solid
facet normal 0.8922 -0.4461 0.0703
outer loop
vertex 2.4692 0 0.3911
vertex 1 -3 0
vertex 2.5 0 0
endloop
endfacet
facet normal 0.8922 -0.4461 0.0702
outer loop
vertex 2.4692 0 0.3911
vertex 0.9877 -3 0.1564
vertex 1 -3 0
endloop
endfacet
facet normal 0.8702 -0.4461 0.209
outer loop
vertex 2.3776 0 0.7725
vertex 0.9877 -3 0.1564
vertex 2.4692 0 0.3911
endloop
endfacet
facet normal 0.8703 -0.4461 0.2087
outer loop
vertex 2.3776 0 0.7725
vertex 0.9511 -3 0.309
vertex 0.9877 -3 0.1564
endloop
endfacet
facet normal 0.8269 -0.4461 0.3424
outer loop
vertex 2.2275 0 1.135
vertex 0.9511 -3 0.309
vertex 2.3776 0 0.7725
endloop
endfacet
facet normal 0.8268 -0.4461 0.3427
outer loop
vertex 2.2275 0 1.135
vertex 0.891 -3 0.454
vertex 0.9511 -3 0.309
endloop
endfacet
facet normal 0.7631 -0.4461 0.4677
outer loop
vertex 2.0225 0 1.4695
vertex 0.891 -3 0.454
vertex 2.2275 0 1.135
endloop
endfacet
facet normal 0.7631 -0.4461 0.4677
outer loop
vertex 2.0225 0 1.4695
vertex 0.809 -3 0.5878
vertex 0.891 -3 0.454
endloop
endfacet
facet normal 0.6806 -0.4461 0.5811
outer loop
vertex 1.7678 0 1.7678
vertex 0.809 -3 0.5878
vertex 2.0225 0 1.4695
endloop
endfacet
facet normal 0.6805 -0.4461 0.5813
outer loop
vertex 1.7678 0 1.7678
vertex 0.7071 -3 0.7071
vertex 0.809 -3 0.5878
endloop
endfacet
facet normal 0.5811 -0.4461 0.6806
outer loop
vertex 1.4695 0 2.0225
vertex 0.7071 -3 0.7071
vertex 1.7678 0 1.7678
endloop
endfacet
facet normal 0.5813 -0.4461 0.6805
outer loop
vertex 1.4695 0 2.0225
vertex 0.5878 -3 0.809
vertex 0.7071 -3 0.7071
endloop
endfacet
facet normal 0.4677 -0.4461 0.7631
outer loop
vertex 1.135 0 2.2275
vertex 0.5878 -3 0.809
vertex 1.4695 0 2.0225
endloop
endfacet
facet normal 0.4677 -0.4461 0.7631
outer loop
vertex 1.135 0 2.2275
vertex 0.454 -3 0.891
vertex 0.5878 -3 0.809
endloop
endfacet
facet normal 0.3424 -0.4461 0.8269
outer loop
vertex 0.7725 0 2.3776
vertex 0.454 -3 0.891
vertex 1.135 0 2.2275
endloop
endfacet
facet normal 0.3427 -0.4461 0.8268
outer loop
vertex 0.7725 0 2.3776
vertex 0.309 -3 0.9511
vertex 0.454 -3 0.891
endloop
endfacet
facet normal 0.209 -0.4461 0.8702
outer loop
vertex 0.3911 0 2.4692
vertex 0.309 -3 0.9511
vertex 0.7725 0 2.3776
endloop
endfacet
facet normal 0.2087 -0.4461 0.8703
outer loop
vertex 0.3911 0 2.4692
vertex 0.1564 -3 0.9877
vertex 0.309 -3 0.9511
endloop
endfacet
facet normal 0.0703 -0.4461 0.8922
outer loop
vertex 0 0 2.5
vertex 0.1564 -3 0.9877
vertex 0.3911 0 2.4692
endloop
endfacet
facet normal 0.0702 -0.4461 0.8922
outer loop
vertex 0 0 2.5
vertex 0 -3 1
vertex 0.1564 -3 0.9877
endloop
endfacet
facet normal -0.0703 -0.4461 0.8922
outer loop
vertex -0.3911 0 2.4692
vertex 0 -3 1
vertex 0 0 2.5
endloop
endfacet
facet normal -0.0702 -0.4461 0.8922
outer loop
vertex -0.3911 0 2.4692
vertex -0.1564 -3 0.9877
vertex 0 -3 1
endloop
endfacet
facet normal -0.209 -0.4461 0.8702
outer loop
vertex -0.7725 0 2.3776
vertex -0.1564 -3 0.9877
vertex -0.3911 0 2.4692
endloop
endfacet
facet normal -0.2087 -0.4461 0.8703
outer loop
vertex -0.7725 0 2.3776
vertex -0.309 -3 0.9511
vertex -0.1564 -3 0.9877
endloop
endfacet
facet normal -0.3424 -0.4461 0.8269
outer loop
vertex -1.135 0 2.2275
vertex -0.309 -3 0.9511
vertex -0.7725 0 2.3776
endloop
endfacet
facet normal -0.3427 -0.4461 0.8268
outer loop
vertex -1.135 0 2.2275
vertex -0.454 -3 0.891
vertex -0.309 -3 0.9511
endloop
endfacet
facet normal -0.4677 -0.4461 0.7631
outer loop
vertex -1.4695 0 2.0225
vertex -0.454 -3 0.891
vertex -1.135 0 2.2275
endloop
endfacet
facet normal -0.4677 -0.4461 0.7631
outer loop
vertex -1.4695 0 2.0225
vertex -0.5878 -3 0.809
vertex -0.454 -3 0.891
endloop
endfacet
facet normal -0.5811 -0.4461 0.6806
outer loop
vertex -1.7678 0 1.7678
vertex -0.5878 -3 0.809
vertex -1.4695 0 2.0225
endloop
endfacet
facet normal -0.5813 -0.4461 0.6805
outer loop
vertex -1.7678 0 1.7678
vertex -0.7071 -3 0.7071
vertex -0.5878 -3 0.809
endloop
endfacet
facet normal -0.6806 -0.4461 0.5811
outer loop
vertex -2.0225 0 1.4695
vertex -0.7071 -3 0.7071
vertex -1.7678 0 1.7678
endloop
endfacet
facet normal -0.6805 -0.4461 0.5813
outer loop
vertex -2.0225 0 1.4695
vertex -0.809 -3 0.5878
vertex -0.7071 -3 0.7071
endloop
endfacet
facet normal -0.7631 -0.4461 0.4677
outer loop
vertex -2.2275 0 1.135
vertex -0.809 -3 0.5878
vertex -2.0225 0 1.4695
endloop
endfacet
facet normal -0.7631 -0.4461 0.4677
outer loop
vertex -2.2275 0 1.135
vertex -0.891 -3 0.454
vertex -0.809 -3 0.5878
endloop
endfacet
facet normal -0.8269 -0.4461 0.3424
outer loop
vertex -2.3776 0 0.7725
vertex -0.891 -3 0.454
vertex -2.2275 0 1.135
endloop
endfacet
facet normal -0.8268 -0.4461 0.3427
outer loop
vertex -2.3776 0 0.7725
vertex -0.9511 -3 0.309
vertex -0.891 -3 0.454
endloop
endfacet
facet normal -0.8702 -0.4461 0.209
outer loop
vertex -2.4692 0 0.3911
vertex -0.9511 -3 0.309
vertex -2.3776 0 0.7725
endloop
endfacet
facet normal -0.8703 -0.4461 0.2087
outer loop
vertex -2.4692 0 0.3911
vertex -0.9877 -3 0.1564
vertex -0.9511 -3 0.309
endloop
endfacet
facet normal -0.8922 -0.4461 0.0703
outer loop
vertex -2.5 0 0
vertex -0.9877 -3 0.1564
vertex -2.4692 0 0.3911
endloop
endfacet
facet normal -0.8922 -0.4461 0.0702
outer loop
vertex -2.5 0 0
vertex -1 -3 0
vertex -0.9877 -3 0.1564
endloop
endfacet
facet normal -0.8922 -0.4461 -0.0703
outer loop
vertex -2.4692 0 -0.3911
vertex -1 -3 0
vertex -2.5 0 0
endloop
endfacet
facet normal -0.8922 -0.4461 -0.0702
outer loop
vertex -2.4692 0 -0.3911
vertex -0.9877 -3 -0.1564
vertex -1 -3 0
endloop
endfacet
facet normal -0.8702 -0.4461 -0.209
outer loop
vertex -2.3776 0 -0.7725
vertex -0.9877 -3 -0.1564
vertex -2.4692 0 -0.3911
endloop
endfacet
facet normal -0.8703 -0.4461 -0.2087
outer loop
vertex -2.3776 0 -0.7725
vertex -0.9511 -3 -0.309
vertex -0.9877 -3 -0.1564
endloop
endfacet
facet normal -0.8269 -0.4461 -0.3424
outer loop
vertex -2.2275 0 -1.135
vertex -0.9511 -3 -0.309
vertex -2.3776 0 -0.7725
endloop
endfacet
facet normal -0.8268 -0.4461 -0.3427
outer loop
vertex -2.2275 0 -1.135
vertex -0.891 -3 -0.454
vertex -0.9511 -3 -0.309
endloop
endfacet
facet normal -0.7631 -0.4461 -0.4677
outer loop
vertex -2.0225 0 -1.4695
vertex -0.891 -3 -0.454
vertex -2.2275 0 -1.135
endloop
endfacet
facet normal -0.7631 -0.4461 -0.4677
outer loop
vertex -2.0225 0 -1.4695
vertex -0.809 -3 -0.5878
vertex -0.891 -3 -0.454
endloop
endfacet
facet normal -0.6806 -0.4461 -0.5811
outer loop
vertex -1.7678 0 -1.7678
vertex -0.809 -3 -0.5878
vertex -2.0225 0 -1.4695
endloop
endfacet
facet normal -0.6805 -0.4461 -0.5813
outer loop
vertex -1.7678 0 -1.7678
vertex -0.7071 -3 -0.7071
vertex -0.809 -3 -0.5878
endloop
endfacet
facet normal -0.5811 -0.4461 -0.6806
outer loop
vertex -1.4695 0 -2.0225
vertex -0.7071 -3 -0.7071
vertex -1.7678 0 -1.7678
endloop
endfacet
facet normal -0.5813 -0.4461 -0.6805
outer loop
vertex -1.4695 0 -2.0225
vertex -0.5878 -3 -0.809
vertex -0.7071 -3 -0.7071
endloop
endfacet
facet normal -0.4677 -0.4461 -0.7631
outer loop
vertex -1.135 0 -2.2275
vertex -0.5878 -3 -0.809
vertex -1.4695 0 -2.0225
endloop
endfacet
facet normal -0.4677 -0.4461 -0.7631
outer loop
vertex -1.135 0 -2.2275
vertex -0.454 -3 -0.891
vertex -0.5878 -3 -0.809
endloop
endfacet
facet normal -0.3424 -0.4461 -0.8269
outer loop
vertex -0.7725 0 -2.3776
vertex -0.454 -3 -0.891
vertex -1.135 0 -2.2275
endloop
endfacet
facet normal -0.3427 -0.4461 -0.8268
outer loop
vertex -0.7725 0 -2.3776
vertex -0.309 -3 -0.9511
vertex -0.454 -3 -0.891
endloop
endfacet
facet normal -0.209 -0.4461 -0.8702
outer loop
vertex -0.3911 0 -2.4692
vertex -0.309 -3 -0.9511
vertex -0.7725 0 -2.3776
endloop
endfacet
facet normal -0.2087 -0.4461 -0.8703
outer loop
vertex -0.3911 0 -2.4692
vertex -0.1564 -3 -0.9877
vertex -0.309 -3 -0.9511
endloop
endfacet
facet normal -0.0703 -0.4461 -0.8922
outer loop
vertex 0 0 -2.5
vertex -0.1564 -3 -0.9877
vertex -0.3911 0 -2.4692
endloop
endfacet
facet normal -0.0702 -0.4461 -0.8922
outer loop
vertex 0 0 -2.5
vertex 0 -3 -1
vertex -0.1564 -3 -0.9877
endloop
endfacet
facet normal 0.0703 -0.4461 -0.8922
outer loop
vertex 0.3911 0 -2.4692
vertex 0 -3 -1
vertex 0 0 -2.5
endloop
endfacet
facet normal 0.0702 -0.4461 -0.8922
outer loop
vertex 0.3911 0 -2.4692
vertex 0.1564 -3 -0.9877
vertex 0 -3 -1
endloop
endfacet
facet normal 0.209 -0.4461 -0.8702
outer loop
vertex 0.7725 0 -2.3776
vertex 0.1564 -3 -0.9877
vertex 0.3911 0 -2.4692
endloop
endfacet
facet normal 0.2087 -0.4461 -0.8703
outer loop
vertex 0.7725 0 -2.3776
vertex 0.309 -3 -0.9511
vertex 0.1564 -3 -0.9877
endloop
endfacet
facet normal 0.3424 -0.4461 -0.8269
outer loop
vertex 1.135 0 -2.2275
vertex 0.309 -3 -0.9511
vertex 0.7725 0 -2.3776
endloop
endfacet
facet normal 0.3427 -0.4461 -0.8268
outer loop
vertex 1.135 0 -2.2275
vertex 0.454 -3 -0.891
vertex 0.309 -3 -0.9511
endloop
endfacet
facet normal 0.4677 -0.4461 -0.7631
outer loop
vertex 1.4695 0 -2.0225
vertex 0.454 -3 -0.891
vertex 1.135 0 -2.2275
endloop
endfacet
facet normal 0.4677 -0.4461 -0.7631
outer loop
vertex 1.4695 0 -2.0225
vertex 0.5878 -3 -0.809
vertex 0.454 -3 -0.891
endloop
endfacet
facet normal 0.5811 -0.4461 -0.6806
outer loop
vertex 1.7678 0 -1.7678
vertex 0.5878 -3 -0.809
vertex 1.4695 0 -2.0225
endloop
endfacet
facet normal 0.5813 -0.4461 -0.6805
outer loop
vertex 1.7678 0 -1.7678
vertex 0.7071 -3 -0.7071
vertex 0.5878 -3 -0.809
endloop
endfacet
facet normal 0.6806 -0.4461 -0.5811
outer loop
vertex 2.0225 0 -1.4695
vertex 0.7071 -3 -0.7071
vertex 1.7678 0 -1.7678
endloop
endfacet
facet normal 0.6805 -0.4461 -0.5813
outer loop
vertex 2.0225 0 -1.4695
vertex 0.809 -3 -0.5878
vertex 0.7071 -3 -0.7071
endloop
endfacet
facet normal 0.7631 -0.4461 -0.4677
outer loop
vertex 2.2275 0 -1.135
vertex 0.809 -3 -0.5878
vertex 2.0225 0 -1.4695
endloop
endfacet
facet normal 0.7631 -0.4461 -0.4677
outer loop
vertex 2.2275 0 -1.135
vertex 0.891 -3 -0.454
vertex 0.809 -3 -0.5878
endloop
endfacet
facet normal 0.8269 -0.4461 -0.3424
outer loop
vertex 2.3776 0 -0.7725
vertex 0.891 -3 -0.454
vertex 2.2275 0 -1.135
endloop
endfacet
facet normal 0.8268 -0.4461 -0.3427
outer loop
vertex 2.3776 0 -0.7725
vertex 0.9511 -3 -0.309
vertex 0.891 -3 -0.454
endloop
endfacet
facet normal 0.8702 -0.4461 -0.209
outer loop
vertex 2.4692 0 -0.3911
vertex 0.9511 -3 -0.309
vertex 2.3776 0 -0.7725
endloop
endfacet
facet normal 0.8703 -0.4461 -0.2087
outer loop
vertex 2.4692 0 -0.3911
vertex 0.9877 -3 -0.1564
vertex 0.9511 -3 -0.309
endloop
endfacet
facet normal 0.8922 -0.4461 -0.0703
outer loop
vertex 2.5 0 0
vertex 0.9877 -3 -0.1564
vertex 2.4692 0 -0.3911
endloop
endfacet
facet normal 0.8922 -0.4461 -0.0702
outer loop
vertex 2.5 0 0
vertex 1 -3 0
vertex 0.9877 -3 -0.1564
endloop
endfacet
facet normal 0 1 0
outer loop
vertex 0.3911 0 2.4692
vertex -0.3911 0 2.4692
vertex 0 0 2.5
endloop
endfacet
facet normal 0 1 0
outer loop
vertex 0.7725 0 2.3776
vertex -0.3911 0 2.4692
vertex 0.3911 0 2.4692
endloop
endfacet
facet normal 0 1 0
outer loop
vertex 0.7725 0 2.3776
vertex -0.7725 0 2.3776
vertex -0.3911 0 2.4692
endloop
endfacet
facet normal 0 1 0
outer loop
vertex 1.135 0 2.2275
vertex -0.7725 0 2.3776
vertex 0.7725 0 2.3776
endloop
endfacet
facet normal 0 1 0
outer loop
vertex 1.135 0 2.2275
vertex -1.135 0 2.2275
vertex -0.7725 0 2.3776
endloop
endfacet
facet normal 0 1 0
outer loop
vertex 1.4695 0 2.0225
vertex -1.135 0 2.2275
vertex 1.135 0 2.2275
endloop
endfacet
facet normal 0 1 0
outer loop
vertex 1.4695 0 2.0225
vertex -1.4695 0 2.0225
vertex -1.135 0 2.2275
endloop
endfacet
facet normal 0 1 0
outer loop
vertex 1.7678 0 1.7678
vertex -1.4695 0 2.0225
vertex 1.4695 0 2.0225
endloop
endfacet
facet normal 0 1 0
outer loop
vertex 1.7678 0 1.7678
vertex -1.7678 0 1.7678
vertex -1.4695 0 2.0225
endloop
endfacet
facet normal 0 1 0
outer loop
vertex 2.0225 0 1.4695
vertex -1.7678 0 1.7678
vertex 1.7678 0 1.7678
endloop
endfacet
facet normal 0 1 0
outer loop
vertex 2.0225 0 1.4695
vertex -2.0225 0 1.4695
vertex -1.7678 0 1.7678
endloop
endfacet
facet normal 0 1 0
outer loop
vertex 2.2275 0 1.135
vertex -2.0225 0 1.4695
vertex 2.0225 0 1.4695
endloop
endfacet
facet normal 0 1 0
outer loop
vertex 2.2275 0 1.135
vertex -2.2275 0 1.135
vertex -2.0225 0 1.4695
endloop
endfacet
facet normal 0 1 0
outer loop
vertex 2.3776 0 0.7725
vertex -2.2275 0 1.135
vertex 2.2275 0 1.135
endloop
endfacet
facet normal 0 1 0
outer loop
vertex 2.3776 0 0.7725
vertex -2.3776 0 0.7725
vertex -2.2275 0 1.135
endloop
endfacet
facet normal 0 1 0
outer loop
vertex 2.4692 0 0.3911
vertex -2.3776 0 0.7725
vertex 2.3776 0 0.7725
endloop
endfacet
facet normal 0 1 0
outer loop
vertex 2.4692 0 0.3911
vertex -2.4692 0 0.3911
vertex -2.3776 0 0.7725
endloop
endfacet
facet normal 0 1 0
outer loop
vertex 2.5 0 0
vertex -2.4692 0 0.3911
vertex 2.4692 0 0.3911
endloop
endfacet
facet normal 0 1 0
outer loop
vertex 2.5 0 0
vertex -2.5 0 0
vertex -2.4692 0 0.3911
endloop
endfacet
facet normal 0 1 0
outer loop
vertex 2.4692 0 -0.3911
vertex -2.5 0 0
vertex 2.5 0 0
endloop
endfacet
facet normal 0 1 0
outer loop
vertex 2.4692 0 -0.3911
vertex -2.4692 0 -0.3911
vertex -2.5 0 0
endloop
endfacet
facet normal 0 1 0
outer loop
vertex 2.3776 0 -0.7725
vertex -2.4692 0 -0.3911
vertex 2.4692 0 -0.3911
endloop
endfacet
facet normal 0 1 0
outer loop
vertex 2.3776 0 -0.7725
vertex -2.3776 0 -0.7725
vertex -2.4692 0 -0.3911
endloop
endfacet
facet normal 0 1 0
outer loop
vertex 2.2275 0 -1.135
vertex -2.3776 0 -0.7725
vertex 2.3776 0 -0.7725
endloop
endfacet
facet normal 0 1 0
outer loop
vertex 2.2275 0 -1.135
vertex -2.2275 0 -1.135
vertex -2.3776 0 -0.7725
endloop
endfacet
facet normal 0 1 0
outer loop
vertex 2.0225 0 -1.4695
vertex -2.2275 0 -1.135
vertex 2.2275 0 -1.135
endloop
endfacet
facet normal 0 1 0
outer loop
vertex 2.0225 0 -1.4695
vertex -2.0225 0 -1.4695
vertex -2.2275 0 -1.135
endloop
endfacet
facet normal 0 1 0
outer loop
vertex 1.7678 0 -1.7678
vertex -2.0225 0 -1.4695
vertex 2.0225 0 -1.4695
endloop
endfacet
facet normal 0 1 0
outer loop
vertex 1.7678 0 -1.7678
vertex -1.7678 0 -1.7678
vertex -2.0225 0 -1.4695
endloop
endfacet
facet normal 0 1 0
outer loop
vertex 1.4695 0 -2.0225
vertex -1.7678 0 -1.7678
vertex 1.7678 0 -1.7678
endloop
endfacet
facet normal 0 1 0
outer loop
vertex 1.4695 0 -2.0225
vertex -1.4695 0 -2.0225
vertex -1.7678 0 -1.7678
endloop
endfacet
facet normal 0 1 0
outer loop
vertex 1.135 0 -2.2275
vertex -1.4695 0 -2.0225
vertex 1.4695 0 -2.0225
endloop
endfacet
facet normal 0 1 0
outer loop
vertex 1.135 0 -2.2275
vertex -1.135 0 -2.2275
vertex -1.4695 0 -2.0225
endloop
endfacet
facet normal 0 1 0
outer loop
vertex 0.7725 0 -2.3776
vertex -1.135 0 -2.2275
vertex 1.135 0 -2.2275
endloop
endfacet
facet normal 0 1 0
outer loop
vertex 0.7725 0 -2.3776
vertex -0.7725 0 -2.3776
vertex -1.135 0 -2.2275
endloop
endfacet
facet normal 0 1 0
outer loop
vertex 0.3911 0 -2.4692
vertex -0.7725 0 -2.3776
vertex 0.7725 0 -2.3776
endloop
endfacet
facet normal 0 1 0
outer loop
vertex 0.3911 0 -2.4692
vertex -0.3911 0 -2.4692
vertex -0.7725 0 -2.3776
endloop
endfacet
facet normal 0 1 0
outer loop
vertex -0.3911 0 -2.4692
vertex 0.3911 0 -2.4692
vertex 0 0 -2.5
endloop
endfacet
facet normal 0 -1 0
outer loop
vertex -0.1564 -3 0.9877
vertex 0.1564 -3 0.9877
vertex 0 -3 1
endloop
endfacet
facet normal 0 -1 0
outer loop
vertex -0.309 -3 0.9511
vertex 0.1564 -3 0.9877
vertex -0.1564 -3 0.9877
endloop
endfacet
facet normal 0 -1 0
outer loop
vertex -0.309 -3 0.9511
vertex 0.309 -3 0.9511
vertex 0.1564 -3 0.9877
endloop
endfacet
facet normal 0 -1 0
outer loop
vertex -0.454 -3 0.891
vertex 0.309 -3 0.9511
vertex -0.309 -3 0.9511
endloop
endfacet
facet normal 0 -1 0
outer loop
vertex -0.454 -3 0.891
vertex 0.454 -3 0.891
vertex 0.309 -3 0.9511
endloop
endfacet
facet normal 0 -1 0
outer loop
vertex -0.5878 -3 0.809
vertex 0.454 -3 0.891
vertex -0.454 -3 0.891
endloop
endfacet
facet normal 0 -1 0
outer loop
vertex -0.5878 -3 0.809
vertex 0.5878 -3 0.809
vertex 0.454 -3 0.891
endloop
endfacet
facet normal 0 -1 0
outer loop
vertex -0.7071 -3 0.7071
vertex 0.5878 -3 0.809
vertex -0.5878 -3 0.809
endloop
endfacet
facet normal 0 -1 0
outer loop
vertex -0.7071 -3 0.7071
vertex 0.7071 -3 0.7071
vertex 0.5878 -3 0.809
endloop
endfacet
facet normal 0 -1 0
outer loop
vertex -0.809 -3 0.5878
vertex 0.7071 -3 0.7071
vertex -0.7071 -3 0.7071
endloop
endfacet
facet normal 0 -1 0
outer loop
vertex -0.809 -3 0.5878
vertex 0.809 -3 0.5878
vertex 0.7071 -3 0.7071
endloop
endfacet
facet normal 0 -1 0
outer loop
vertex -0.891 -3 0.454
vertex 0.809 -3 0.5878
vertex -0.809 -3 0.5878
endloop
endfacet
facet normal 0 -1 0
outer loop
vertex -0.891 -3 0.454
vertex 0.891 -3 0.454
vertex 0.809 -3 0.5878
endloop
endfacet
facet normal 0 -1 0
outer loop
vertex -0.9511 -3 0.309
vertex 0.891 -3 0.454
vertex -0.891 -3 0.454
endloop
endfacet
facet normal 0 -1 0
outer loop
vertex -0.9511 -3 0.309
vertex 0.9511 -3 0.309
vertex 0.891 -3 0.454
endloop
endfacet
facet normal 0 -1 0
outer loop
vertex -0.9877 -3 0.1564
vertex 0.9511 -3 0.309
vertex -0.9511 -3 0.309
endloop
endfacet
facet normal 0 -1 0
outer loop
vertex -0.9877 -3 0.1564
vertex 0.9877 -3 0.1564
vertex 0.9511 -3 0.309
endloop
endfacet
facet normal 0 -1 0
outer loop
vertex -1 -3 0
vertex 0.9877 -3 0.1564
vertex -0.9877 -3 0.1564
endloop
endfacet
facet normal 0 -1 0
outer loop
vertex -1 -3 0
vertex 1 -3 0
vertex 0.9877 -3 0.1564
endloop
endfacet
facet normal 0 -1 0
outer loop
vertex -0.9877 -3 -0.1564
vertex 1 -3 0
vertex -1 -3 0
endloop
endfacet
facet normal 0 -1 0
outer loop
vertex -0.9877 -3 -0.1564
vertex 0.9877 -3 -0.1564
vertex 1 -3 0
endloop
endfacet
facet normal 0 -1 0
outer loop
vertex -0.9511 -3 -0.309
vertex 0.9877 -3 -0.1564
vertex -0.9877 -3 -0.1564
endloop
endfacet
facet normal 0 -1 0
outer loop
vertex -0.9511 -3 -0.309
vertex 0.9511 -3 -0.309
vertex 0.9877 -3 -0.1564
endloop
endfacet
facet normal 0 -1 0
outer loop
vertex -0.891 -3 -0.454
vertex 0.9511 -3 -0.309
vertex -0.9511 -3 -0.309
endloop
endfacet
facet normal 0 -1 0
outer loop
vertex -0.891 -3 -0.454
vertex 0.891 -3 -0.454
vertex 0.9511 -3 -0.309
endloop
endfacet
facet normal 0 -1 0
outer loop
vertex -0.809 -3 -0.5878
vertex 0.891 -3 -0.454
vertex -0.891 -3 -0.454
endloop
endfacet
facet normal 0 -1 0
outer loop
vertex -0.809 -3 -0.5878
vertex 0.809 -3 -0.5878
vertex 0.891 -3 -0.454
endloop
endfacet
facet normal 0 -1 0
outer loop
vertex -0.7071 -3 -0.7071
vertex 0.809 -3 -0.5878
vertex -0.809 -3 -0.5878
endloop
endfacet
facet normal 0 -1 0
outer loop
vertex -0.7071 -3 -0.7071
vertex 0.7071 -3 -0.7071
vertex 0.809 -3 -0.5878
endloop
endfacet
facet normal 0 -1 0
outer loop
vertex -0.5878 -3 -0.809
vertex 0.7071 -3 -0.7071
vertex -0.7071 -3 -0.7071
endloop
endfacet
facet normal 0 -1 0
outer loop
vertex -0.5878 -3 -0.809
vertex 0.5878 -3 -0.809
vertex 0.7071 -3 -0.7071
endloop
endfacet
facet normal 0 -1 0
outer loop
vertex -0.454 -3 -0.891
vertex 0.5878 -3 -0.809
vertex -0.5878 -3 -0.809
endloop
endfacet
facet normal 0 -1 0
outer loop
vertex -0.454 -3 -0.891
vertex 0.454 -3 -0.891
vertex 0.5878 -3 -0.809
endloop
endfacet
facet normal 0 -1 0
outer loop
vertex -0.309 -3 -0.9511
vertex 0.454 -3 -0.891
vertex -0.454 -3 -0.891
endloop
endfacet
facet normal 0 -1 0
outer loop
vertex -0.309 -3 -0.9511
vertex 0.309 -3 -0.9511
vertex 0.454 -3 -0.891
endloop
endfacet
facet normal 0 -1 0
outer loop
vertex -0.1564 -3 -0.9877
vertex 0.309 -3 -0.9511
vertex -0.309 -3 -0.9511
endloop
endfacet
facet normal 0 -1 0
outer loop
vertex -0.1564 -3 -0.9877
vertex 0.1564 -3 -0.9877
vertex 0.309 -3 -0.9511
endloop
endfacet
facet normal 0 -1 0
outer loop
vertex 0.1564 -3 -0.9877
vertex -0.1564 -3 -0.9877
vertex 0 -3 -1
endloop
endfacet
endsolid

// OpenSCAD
// file: roundCornersCube.scad
/*
http://codeviewer.org/view/code:1b36 
Copyright (C) 2011 Sergio Vilches
This program is free software: you can redistribute it and/or modify it under the terms of the GNU General Public License as published by the Free Software Foundation, either version 3 of the License, or (at your option) any later version.
This program is distributed in the hope that it will be useful, but WITHOUT ANY WARRANTY; without even the implied warranty of MERCHANTABILITY or FITNESS FOR A PARTICULAR PURPOSE. See the GNU General Public License for more details. You should have received a copy of the GNU General Public License along with this program. If not, see <http://www.gnu.org/licenses/>.
Contact: s.vilches.e@gmail.com


    ----------------------------------------------------------- 
                 Round Corners Cube (Extruded)                
      roundCornersCube(x,y,z,r) Where:                        
         - x = Xdir width                                     
         - y = Ydir width                                     
         - z = Height of the cube                             
         - r = Rounding radious                               
                                                              
      Example: roundCornerCube(10,10,2,1);                    
     *Some times it's needed to use F6 to see good results!   
 	 ----------------------------------------------------------- 
*/
// Test it!
// roundCornersCube(10,5,2,1);


module createMeniscus(h,radius) // This module creates the shape that needs to be substracted from a cube to make its corners rounded.
difference(){        //This shape is basicly the difference between a quarter of cylinder and a cube
   translate([radius/2+0.1,radius/2+0.1,0]){
      cube([radius+0.2,radius+0.1,h+0.2],center=true);         // All that 0.x numbers are to avoid "ghost boundaries" when substracting
   }

   cylinder(h=h+0.2,r=radius,$fn = 25,center=true);
}


module rCube(x,y,z,r)  // Now we just substract the shape we have created in the four corners
difference(){
   cube([x,y,z], center=true);

translate([x/2-r,y/2-r]){  // We move to the first corner (x,y)
      rotate(0){  
         createMeniscus(z,r); // And substract the meniscus
      }
   }
   translate([-x/2+r,y/2-r]){ // To the second corner (-x,y)
      rotate(90){
         createMeniscus(z,r); // But this time we have to rotate the meniscus 90 deg
      }
   }
      translate([-x/2+r,-y/2+r]){ // ... 
      rotate(180){
         createMeniscus(z,r);
      }
   }
      translate([x/2-r,-y/2+r]){
      rotate(270){
         createMeniscus(z,r);
      }
   }
}

module createSubtractor(h,radius) //Create the shape that needs to be substracted from a cube
difference(){ cube([radius+0.1,radius+0.1,h]); cylinder(h=h,r=radius+0.1,$fn = 25); } //+0.1 stops ghost edges

module rCube(x,y,z,r)//Create a cube and subtract the 4 corners
difference(){
cube([x,y,z]);
translate([x-r,y-r]) rotate(0) createSubtractor(z,r); 
translate([r,y-r]) rotate(90) createSubtractor(z,r);
translate([r,r]) rotate(180) createSubtractor(z,r);
translate([x-r,r]) rotate(270) createSubtractor(z,r);
}
// file: wallet.scad
include <roundCornersCube.scad>

//credit card width
cw = 53.98;

ch = 85.6;

w = 5;

module credit_card()
{
rCube(cw,ch,1.5,5);


}

module wallet()
{
rCube(cw+w*2, ch+w*2, 8, 6);


}


translate([0,0,20])
credit_card();

minkowski()
{
sphere(r=3);
wallet();
}
// main file
$fn = 40;
use <wallet.scad>

//credit_card();

//hinge give
hg = .1;




module hinge_m()
{



rotate([90,0,0])
cylinder(r1=2.5, r2=1, h=3);

}

hinge_m();
